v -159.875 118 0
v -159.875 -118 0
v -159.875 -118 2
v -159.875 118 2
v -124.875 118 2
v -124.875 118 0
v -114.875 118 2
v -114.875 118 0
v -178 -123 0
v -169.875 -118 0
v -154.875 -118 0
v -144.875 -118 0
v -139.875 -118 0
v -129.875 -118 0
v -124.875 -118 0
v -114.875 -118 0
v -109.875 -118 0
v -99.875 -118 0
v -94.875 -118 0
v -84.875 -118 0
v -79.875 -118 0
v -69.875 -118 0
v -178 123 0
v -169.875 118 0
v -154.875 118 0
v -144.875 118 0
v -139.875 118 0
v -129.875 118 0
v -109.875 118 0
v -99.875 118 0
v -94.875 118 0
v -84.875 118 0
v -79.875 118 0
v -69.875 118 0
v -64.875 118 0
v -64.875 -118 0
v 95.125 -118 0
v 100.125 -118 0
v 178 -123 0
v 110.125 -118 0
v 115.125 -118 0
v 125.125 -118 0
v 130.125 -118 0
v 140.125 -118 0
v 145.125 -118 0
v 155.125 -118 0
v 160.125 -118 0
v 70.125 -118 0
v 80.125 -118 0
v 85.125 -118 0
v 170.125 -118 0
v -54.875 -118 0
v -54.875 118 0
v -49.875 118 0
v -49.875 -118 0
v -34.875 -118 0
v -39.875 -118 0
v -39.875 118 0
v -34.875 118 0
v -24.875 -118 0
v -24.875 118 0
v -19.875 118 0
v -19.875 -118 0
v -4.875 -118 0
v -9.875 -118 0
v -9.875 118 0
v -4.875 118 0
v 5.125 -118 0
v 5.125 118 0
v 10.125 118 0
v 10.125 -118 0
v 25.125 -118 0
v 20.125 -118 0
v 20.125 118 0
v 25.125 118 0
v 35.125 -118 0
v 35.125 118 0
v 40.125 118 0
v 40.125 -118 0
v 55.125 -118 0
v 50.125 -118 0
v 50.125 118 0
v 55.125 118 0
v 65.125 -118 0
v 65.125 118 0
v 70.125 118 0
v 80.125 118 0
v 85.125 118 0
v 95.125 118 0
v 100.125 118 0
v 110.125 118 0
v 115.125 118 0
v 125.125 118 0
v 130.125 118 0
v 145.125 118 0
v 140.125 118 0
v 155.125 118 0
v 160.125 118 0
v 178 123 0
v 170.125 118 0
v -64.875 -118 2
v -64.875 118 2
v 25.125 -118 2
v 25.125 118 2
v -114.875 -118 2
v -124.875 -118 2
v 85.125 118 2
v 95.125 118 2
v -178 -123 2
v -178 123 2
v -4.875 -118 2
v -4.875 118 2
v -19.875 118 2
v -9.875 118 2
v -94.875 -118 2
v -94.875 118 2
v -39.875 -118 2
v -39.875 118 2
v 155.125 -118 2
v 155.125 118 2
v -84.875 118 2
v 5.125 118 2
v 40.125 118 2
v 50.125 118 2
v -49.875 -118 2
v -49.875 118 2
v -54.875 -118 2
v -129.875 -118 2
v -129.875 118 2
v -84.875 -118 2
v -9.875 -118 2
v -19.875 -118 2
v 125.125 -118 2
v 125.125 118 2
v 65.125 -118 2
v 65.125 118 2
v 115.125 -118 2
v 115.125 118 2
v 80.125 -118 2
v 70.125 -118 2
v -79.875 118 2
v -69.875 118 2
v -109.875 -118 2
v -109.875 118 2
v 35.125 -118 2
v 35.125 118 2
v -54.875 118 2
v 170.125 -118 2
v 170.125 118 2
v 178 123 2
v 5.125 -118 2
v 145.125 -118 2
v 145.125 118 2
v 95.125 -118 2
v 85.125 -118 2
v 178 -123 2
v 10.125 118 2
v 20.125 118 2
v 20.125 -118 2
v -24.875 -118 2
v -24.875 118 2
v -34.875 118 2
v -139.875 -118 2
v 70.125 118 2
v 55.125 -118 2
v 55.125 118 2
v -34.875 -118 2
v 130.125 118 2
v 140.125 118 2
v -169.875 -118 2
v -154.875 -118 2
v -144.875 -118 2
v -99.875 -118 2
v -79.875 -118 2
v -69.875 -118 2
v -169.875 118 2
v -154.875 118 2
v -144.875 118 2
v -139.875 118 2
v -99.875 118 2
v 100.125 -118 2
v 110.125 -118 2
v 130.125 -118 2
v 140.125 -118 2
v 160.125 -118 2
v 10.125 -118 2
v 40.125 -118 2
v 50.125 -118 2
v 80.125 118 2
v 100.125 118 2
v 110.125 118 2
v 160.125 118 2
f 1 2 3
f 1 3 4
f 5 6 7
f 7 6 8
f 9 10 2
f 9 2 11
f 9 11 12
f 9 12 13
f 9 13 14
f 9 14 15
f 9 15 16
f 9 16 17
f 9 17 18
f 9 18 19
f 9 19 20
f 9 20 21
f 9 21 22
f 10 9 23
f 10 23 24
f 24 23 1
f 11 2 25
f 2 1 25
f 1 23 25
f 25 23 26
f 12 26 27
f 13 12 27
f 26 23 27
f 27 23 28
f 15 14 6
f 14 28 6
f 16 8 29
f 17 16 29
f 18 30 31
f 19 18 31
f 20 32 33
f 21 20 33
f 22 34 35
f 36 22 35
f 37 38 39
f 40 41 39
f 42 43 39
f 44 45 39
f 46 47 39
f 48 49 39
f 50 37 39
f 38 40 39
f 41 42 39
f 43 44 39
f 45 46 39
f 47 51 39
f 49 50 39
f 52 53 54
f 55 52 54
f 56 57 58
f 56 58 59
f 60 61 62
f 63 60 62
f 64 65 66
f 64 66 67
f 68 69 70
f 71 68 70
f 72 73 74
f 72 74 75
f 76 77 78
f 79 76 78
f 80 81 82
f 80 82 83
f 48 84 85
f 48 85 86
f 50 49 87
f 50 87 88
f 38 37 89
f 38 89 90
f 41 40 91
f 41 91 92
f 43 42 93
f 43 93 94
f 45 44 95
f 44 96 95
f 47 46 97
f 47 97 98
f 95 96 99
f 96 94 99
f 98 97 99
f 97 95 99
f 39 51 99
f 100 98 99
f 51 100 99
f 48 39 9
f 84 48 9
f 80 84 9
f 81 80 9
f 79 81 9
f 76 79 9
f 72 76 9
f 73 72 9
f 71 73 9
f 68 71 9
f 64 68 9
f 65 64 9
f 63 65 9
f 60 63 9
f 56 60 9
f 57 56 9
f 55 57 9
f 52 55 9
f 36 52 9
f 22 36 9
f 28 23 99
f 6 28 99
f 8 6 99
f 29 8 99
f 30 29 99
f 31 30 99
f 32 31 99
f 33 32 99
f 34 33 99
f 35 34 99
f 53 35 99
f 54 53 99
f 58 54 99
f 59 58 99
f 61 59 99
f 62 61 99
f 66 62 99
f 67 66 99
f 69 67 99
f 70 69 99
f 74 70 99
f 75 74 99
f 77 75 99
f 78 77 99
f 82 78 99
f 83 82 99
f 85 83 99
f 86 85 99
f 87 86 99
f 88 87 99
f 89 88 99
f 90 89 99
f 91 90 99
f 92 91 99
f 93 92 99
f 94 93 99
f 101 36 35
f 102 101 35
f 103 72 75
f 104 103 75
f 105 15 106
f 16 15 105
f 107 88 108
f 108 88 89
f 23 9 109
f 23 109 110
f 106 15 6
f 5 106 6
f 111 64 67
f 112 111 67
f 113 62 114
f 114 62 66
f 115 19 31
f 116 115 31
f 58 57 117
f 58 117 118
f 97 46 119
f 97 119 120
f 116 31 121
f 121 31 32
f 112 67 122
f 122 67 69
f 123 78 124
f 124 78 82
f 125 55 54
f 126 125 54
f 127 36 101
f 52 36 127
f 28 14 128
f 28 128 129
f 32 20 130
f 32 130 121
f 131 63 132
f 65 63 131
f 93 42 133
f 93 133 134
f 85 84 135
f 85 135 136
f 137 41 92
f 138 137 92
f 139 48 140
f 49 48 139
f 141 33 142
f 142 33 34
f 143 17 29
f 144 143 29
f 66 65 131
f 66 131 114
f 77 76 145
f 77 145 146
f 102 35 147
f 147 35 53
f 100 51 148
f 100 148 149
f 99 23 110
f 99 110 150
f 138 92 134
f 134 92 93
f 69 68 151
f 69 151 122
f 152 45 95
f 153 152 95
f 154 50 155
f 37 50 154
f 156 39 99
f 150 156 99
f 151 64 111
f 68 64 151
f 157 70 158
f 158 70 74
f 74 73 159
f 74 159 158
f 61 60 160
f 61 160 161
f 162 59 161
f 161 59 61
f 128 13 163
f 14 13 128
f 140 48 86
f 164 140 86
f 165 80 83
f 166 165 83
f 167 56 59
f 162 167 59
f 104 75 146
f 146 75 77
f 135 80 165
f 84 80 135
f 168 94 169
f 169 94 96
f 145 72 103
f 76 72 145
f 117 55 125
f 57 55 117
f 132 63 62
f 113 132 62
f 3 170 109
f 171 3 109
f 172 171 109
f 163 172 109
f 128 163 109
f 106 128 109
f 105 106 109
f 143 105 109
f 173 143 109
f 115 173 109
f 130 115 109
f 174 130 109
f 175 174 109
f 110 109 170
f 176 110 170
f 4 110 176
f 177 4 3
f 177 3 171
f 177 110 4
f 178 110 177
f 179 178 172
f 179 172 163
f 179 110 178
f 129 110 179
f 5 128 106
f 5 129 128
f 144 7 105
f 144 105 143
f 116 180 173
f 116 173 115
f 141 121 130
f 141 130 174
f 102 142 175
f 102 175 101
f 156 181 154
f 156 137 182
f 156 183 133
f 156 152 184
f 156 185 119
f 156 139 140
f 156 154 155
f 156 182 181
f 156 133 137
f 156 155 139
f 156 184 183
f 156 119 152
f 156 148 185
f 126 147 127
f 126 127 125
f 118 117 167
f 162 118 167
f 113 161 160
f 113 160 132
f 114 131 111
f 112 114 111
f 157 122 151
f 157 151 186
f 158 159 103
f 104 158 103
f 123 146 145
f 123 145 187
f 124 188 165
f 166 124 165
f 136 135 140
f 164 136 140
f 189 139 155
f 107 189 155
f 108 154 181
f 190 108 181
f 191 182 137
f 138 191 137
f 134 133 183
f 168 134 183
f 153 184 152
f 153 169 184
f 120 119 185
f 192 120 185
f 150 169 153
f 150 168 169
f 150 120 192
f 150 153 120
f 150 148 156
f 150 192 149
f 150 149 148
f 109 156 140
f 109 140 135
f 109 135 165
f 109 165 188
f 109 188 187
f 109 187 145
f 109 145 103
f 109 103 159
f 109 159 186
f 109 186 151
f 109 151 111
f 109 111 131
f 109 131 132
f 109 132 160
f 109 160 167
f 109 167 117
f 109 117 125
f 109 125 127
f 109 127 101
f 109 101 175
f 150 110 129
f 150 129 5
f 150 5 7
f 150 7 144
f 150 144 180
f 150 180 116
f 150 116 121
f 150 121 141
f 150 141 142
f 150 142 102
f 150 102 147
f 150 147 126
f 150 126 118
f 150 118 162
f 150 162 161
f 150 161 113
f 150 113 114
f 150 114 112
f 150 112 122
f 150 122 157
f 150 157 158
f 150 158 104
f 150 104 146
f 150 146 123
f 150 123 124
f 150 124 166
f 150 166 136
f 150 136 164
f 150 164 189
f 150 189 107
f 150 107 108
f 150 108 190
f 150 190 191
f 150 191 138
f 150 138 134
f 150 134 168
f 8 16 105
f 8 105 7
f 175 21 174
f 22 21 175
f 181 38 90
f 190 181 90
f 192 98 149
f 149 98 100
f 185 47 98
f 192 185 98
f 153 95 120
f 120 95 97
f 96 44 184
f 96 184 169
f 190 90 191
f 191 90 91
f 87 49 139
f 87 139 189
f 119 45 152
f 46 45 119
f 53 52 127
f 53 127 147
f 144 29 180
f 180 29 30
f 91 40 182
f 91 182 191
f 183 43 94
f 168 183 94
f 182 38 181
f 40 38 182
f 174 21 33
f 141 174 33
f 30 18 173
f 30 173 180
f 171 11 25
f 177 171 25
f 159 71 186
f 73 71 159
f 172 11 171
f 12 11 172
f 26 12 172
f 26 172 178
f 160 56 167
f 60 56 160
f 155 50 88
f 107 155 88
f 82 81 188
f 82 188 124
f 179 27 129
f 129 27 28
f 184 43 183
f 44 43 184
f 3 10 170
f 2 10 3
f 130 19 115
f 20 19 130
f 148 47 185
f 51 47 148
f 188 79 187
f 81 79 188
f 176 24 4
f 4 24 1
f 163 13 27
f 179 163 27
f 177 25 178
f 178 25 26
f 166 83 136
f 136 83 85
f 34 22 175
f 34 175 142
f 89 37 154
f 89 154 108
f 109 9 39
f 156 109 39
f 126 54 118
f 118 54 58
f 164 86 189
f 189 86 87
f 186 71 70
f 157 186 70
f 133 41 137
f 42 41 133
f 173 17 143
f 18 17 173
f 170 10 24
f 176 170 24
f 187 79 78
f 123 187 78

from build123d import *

# Parameters (mm, degrees)
F0_W     = 356
F0_H     = 246
F1_DEPTH = 2
F2_W     = 10
F2_H     = 236
F3_DEPTH = 5


with BuildPart() as f1:
    # F0 (on Top) → F1 (new body)
    with BuildSketch(Plane.XY):
        Rectangle(F0_W, F0_H)
    extrude(amount=F1_DEPTH)

    # F2 (on Top) → F3 (cut)
    with BuildSketch(Plane.XY):
        with Locations((-164.875, 0)):
            Rectangle(F2_W, F2_H)
        with Locations((-149.875, 0)):
            Rectangle(F2_W, F2_H)
        with Locations((-134.875, 0)):
            Rectangle(F2_W, F2_H)
        with Locations((-119.875, 0)):
            Rectangle(F2_W, F2_H)
        with Locations((-104.875, 0)):
            Rectangle(F2_W, F2_H)
        with Locations((-89.875, 0)):
            Rectangle(F2_W, F2_H)
        with Locations((-74.875, 0)):
            Rectangle(F2_W, F2_H)
        with Locations((-59.875, 0)):
            Rectangle(F2_W, F2_H)
        with Locations((-44.875, 0)):
            Rectangle(F2_W, F2_H)
        with Locations((-29.875, 0)):
            Rectangle(F2_W, F2_H)
        with Locations((-14.875, 0)):
            Rectangle(F2_W, F2_H)
        with Locations((0.125, 0)):
            Rectangle(F2_W, F2_H)
        with Locations((15.125, 0)):
            Rectangle(F2_W, F2_H)
        with Locations((30.125, 0)):
            Rectangle(F2_W, F2_H)
        with Locations((45.125, 0)):
            Rectangle(F2_W, F2_H)
        with Locations((60.125, 0)):
            Rectangle(F2_W, F2_H)
        with Locations((75.125, 0)):
            Rectangle(F2_W, F2_H)
        with Locations((90.125, 0)):
            Rectangle(F2_W, F2_H)
        with Locations((105.125, 0)):
            Rectangle(F2_W, F2_H)
        with Locations((120.125, 0)):
            Rectangle(F2_W, F2_H)
        with Locations((135.125, 0)):
            Rectangle(F2_W, F2_H)
        with Locations((150.125, 0)):
            Rectangle(F2_W, F2_H)
        with Locations((165.125, 0)):
            Rectangle(F2_W, F2_H)
    extrude(amount=F3_DEPTH, mode=Mode.SUBTRACT)


solid = f1.part
